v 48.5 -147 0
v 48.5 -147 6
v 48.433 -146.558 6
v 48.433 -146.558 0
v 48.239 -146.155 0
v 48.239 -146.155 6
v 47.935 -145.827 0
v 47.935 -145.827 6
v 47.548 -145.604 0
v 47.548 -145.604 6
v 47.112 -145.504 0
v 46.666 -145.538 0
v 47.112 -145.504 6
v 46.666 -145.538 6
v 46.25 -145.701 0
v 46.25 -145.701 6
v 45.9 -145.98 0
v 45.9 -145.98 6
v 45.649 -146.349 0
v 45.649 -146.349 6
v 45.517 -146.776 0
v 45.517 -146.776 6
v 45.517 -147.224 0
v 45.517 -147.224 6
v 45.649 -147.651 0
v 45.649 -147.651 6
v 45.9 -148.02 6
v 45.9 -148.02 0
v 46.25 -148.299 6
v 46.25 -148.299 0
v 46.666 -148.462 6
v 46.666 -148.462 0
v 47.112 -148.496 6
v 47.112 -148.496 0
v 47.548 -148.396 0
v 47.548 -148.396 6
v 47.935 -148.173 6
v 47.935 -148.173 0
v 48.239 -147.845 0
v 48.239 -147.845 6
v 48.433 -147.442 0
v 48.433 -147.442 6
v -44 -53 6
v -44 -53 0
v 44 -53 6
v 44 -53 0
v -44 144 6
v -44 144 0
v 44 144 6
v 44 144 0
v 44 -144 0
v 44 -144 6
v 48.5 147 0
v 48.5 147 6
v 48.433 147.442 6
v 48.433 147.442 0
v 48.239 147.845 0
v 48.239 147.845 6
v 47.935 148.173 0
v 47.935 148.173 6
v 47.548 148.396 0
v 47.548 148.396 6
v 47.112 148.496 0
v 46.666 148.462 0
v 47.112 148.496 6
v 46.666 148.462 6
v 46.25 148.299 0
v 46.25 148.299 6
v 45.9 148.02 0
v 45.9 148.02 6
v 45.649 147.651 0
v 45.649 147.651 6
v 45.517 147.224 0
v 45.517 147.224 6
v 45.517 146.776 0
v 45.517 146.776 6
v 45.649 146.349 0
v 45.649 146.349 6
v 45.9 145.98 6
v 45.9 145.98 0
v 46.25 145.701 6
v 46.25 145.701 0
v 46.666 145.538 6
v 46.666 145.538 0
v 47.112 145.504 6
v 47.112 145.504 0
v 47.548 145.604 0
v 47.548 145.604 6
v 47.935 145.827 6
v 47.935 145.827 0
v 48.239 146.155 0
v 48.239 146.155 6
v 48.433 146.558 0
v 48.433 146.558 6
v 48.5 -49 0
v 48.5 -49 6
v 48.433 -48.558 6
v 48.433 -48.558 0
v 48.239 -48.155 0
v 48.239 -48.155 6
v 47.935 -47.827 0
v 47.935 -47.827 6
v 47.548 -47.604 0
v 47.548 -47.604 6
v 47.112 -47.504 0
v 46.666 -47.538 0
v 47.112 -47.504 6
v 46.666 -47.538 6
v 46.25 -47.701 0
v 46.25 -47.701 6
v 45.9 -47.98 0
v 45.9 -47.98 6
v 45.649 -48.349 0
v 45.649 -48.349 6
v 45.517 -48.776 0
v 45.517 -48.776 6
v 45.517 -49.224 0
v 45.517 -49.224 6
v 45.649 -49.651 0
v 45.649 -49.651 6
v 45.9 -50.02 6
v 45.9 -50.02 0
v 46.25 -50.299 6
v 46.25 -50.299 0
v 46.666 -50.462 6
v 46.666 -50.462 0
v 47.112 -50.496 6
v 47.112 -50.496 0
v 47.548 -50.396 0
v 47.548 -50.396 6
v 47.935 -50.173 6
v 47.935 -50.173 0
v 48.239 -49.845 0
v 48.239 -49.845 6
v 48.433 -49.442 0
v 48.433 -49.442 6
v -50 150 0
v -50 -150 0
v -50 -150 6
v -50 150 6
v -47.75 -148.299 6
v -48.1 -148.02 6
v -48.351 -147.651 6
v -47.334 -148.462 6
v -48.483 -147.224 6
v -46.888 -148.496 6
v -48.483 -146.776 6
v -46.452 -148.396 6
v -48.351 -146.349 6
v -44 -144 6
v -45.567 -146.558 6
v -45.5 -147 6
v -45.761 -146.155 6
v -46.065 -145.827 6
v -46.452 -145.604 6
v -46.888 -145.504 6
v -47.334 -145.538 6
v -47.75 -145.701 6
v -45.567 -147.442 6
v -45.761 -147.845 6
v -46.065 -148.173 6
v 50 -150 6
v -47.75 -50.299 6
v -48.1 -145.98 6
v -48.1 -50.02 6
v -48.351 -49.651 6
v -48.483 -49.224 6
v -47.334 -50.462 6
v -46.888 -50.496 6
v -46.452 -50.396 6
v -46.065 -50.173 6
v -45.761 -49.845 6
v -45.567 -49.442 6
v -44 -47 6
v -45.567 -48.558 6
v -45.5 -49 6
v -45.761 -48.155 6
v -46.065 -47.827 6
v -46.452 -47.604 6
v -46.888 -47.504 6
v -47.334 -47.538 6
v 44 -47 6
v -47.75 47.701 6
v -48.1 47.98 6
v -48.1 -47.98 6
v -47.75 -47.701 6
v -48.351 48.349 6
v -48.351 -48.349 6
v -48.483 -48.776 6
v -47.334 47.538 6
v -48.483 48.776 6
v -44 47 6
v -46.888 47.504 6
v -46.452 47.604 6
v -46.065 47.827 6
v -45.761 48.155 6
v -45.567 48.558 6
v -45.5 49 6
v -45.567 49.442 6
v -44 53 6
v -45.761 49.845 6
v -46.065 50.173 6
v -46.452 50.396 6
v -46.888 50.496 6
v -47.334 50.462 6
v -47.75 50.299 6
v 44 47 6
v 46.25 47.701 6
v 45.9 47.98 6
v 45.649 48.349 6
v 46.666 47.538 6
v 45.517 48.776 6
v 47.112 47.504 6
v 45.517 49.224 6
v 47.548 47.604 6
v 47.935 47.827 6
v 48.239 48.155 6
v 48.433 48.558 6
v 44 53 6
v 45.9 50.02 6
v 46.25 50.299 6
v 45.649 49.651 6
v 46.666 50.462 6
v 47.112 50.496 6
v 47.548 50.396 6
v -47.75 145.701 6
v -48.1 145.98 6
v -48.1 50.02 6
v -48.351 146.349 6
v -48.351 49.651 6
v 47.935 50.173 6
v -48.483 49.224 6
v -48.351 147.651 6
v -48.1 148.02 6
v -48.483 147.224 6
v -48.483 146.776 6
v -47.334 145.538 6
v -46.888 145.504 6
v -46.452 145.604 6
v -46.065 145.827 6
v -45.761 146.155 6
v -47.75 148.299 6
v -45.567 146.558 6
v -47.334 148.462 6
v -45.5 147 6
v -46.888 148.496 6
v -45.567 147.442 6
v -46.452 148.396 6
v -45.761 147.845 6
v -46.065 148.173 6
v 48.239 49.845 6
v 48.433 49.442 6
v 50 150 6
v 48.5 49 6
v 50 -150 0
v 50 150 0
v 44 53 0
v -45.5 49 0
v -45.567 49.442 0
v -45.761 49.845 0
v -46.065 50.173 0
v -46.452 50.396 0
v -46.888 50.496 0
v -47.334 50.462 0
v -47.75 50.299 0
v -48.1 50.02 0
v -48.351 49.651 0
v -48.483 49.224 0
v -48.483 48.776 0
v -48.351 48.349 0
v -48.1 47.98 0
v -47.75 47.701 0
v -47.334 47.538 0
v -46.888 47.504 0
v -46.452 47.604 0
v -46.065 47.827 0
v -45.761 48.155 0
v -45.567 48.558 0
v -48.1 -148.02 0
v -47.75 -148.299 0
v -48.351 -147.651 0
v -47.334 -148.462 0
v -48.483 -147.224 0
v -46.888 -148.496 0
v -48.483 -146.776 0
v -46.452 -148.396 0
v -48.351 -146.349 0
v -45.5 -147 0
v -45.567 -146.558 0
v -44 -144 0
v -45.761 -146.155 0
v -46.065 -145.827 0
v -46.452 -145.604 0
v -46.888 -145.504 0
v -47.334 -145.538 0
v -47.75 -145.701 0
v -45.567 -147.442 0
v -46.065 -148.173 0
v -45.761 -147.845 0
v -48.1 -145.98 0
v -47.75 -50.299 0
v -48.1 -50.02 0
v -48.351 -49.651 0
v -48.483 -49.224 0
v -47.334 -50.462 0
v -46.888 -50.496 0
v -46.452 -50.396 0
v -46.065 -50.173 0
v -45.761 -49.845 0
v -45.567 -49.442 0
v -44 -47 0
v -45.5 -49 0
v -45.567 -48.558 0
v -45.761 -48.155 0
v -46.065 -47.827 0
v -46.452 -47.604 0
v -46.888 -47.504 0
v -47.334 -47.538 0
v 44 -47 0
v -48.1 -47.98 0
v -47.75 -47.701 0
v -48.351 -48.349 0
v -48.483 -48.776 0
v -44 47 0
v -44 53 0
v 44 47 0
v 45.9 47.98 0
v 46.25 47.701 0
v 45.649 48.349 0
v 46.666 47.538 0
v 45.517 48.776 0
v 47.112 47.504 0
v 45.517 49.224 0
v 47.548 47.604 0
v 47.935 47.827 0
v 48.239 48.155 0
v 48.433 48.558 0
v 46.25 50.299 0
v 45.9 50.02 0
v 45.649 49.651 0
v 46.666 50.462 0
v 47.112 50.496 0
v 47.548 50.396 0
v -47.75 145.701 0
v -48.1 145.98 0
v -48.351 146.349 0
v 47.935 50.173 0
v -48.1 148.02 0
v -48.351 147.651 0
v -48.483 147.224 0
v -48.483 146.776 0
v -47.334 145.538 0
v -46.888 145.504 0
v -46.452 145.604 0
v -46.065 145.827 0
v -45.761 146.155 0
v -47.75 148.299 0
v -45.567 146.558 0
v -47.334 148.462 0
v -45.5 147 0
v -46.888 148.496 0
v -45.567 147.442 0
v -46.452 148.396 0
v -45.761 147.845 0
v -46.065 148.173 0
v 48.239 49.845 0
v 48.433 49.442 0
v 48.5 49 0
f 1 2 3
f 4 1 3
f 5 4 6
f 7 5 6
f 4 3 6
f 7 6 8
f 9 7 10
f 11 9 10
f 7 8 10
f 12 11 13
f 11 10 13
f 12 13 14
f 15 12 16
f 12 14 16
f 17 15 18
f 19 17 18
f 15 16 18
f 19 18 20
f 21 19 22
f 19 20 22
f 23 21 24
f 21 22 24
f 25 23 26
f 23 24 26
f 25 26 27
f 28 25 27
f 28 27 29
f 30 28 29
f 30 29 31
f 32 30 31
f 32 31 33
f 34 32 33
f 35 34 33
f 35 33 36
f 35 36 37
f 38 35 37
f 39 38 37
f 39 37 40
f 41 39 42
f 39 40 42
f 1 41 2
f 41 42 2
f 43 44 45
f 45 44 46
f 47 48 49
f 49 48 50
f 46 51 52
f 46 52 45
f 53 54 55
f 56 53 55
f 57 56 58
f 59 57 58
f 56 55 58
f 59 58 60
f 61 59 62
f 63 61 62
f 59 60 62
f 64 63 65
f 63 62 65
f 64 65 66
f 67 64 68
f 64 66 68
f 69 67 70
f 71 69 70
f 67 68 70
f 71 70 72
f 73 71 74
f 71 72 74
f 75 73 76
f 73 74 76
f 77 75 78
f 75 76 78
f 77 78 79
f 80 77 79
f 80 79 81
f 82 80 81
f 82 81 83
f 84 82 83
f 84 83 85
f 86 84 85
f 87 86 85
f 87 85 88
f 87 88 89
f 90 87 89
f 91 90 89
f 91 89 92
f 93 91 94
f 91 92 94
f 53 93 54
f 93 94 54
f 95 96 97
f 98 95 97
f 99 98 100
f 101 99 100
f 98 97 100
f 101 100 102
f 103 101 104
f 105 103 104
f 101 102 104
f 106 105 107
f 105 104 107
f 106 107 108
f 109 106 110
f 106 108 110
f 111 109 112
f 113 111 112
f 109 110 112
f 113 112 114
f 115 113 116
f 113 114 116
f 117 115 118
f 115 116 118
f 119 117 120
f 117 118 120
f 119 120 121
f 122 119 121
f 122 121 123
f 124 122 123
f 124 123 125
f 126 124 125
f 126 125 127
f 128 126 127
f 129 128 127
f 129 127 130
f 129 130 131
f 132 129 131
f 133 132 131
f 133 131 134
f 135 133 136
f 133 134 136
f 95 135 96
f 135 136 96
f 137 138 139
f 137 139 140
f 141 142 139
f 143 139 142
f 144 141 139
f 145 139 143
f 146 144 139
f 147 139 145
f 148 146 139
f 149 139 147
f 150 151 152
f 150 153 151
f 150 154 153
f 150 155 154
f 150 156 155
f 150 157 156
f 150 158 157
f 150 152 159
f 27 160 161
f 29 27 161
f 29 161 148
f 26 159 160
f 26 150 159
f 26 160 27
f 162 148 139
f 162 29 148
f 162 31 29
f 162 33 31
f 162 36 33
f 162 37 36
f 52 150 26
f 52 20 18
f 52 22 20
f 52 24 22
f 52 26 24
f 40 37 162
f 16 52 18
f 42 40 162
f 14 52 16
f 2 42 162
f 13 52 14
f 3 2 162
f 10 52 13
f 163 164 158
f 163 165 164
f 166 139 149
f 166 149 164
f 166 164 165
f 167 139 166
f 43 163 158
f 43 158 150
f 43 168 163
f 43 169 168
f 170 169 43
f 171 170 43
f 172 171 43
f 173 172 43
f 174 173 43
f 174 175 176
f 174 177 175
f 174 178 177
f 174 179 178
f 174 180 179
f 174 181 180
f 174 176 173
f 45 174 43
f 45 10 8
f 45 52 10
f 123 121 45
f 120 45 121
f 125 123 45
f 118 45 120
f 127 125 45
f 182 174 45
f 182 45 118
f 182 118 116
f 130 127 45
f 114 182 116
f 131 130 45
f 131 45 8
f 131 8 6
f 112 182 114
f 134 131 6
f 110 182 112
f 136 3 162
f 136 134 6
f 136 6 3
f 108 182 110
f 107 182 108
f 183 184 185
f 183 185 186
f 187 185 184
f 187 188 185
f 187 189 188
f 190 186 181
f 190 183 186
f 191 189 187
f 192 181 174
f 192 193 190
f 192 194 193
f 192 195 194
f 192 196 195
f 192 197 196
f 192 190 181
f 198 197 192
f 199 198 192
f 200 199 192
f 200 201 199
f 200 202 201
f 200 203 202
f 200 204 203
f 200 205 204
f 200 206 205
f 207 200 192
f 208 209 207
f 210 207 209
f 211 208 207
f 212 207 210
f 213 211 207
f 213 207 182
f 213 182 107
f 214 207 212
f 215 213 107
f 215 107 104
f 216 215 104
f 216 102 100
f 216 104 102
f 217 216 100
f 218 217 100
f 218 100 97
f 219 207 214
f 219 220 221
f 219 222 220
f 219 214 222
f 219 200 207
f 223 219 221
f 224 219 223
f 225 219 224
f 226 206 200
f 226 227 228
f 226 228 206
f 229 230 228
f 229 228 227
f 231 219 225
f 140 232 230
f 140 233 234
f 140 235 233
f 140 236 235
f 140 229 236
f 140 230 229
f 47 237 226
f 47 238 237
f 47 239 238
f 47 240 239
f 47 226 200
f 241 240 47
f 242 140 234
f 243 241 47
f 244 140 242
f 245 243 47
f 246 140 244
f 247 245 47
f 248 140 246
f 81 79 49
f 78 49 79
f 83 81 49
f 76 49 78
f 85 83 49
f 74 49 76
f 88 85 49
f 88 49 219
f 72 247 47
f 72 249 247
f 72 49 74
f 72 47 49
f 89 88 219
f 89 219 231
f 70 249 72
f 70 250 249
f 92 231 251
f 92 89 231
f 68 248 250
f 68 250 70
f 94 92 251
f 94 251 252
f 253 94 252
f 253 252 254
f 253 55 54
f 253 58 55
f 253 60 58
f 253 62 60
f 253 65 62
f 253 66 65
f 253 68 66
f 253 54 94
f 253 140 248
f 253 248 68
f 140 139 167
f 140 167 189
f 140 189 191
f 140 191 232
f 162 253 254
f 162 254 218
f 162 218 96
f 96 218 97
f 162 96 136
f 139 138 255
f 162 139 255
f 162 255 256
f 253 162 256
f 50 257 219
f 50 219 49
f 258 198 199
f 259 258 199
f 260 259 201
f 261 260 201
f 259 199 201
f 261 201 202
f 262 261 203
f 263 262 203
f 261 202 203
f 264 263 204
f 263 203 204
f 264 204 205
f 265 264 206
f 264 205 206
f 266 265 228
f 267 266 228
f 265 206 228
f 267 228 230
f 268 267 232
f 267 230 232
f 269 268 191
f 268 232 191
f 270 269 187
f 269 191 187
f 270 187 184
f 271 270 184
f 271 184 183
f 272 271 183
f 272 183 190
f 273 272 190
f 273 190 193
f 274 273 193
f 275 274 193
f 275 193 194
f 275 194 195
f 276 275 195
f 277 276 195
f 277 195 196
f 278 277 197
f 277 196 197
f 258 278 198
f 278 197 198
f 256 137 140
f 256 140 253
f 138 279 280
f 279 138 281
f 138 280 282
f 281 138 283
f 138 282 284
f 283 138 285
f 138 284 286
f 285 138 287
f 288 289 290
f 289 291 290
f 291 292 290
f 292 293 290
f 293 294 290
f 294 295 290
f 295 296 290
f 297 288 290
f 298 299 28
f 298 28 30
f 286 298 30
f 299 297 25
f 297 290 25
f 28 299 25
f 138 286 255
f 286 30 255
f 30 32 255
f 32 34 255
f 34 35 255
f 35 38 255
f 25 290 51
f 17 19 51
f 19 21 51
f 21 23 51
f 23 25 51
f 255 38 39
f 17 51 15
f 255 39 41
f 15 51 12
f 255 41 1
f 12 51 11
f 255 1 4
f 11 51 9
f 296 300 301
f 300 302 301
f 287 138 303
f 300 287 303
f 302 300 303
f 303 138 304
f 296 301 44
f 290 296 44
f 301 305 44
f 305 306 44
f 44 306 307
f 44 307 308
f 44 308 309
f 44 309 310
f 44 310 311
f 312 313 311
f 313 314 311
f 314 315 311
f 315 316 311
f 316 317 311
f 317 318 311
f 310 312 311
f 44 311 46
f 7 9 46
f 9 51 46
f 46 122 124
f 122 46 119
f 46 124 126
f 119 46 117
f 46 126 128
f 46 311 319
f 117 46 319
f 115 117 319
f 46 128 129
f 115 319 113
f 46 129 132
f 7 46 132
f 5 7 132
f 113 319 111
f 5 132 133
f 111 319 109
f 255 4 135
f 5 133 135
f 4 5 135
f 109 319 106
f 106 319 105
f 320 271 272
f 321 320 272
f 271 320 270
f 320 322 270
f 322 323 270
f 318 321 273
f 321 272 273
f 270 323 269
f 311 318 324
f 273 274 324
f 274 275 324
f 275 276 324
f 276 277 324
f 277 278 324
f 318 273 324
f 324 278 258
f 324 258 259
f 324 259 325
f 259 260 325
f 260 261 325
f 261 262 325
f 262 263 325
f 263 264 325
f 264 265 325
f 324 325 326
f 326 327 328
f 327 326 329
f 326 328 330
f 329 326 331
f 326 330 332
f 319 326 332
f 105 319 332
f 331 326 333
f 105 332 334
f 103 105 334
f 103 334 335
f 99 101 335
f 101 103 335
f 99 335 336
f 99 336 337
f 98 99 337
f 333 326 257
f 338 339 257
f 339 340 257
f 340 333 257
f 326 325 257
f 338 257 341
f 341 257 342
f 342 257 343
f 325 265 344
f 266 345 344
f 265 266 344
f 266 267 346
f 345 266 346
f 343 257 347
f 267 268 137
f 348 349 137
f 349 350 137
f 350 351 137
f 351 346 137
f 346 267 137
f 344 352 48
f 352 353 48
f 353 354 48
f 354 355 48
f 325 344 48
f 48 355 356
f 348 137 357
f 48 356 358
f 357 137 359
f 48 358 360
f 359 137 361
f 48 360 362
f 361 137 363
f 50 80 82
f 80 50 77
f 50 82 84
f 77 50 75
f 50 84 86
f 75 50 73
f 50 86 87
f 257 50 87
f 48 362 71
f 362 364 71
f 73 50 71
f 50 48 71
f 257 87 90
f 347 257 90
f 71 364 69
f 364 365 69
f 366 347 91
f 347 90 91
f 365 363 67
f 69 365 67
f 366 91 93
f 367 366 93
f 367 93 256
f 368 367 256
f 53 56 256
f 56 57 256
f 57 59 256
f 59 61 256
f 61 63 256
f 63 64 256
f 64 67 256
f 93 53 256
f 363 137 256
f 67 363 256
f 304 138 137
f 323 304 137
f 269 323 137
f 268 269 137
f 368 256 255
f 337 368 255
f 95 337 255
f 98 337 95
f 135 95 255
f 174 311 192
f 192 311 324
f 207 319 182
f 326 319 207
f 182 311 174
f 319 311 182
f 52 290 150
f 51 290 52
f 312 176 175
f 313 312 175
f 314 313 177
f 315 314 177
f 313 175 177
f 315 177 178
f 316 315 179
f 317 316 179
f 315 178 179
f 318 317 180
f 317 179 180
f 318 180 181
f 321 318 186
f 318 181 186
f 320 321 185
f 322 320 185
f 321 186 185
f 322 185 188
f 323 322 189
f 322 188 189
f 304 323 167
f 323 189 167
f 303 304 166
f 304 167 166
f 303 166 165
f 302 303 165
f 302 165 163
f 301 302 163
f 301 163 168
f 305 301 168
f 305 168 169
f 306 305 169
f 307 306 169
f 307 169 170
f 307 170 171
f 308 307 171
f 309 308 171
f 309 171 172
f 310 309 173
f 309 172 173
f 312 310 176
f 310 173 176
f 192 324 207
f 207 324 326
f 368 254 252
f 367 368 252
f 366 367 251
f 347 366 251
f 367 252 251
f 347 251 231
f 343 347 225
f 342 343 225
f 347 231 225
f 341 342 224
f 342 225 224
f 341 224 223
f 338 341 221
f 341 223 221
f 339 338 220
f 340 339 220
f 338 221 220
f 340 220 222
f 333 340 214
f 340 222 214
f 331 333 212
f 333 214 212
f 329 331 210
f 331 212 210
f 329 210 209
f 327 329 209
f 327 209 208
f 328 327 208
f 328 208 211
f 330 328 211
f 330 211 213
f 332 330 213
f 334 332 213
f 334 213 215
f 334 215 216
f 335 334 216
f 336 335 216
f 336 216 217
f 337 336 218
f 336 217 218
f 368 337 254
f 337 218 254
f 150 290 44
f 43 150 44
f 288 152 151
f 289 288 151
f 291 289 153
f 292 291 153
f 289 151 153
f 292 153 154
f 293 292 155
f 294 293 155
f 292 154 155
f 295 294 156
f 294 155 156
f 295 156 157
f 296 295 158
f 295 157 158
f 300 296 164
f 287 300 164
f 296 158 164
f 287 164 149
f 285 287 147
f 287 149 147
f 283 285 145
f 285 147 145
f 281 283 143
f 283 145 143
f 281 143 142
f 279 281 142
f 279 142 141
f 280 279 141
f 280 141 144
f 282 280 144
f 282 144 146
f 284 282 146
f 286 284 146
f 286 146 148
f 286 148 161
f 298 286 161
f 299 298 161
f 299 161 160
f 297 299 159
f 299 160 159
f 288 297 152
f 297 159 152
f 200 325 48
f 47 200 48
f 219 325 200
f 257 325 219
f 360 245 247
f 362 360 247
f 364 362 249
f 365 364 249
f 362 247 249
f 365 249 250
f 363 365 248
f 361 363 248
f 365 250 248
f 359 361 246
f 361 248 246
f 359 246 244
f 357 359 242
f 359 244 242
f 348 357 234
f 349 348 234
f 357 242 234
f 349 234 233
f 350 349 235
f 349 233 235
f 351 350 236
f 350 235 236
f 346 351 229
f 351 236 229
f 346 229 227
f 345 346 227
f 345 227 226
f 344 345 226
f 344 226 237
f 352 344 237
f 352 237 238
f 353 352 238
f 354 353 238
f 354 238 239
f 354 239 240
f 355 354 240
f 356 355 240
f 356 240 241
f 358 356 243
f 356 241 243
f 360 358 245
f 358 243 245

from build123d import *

# Parameters (mm, degrees)
SKETCH1_W           = 100
SKETCH1_H           = 300
SKETCH1_W_2         = 88
SKETCH1_H_2         = 91
SKETCH1_H_3         = 94
BOSS_EXTRUDE1_DEPTH = 6
SKETCH2_R           = 1.5
CUT_EXTRUDE1_DEPTH  = 6


with BuildPart() as part:
    # Sketch1 → Boss-Extrude1 (new body)
    with BuildSketch(Plane.XY):
        Rectangle(SKETCH1_W, SKETCH1_H)
        with Locations((0, 98.5)):
            Rectangle(SKETCH1_W_2, SKETCH1_H_2, mode=Mode.SUBTRACT)
        with Locations((0, -98.5)):
            Rectangle(SKETCH1_W_2, SKETCH1_H_2, mode=Mode.SUBTRACT)
        Rectangle(SKETCH1_W_2, SKETCH1_H_3, mode=Mode.SUBTRACT)
    extrude(amount=BOSS_EXTRUDE1_DEPTH)

    # Sketch2 → Cut-Extrude1 (cut)
    with BuildSketch(Plane.XY.offset(6)):
        with Locations((-47, 147)):
            Circle(SKETCH2_R)
        with Locations((47, 147)):
            Circle(SKETCH2_R)
        with Locations((47, 49)):
            Circle(SKETCH2_R)
        with Locations((47, -49)):
            Circle(SKETCH2_R)
        with Locations((47, -147)):
            Circle(SKETCH2_R)
        with Locations((-47, 49)):
            Circle(SKETCH2_R)
        with Locations((-47, -49)):
            Circle(SKETCH2_R)
        with Locations((-47, -147)):
            Circle(SKETCH2_R)
    extrude(amount=-CUT_EXTRUDE1_DEPTH, mode=Mode.SUBTRACT)


solid = part.part
